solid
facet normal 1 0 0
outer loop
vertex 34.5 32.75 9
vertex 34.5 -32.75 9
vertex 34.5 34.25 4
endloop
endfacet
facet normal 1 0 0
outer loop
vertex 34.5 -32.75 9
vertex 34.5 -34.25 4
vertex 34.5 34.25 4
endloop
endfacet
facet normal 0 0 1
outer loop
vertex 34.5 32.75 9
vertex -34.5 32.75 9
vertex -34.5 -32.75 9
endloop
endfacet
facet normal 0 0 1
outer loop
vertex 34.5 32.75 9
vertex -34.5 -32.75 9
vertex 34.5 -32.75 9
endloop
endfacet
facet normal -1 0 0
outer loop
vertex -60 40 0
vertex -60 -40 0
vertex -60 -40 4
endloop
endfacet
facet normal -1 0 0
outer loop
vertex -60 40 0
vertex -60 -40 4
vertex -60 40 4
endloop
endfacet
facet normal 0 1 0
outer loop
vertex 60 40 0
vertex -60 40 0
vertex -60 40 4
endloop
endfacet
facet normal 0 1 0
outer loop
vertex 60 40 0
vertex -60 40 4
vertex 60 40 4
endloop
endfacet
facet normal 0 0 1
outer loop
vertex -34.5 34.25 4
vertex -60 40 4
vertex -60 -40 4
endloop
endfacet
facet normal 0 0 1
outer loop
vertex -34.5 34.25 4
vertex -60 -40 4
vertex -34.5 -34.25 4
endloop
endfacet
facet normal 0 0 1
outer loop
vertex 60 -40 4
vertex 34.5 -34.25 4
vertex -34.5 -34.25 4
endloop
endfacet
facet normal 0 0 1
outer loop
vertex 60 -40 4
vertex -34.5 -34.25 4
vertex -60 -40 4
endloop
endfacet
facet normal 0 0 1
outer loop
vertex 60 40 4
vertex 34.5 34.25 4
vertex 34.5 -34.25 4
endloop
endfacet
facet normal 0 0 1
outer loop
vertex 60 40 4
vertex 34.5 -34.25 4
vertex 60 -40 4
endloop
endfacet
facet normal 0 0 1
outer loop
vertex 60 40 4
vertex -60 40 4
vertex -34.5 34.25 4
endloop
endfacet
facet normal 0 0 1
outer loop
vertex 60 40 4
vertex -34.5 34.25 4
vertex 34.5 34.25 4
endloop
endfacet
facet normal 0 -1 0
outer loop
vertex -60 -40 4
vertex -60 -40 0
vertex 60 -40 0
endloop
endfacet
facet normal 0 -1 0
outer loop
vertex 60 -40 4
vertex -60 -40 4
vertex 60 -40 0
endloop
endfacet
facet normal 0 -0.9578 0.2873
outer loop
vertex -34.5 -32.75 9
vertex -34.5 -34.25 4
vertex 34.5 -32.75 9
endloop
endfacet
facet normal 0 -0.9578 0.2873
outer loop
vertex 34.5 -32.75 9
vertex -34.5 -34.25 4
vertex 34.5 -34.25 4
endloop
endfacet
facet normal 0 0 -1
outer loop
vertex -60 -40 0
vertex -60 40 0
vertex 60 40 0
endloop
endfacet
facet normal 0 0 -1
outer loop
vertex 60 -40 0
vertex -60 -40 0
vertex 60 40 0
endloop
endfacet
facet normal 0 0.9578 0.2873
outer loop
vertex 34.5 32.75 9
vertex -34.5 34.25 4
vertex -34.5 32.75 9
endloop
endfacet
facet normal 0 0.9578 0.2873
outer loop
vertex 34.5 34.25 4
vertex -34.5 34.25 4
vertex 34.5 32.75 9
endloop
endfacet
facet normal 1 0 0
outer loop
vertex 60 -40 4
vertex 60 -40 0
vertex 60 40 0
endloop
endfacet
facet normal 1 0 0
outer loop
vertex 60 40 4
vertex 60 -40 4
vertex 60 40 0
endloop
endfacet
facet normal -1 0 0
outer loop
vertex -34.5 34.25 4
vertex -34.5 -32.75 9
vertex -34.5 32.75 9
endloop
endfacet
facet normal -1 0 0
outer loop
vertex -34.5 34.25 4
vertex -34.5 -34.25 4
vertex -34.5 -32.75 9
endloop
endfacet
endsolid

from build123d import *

# Parameters (mm, degrees)
F0_W     = 120
F0_H     = 80
F1_DEPTH = 4
F2_W     = 69
F2_H     = 68.5
F3_DEPTH = 5
F4_SIZE2 = 4.99999
F4_SIZE  = 1.49999


# Not quite as in the source:
# - a fillet or chamfer is up to 0.001 mm smaller than in the source, because OpenCascade refuses the exact size


with BuildPart() as f1:
    # F0 (on Top) → F1 (new body)
    with BuildSketch(Plane.XY):
        Rectangle(F0_W, F0_H)
    extrude(amount=F1_DEPTH)

    # F2 (on face) → F3 (join)
    with BuildSketch(Plane.XY.offset(4)):
        Rectangle(F2_W, F2_H)
    extrude(amount=F3_DEPTH)

    # F4 (size 1.5 and 5 in the source; OpenCascade refuses exactly that, so slightly less here)
    f4_edges = [f1.edges().sort_by_distance(p)[0] for p in [
        (0, 34.25, 9),
        (0, -34.25, 9),
    ]]
    f4_side = f1.faces().sort_by_distance((0, 0, 9))[0]
    chamfer(f4_edges, length=F4_SIZE, length2=F4_SIZE2, reference=f4_side)


solid = f1.part
